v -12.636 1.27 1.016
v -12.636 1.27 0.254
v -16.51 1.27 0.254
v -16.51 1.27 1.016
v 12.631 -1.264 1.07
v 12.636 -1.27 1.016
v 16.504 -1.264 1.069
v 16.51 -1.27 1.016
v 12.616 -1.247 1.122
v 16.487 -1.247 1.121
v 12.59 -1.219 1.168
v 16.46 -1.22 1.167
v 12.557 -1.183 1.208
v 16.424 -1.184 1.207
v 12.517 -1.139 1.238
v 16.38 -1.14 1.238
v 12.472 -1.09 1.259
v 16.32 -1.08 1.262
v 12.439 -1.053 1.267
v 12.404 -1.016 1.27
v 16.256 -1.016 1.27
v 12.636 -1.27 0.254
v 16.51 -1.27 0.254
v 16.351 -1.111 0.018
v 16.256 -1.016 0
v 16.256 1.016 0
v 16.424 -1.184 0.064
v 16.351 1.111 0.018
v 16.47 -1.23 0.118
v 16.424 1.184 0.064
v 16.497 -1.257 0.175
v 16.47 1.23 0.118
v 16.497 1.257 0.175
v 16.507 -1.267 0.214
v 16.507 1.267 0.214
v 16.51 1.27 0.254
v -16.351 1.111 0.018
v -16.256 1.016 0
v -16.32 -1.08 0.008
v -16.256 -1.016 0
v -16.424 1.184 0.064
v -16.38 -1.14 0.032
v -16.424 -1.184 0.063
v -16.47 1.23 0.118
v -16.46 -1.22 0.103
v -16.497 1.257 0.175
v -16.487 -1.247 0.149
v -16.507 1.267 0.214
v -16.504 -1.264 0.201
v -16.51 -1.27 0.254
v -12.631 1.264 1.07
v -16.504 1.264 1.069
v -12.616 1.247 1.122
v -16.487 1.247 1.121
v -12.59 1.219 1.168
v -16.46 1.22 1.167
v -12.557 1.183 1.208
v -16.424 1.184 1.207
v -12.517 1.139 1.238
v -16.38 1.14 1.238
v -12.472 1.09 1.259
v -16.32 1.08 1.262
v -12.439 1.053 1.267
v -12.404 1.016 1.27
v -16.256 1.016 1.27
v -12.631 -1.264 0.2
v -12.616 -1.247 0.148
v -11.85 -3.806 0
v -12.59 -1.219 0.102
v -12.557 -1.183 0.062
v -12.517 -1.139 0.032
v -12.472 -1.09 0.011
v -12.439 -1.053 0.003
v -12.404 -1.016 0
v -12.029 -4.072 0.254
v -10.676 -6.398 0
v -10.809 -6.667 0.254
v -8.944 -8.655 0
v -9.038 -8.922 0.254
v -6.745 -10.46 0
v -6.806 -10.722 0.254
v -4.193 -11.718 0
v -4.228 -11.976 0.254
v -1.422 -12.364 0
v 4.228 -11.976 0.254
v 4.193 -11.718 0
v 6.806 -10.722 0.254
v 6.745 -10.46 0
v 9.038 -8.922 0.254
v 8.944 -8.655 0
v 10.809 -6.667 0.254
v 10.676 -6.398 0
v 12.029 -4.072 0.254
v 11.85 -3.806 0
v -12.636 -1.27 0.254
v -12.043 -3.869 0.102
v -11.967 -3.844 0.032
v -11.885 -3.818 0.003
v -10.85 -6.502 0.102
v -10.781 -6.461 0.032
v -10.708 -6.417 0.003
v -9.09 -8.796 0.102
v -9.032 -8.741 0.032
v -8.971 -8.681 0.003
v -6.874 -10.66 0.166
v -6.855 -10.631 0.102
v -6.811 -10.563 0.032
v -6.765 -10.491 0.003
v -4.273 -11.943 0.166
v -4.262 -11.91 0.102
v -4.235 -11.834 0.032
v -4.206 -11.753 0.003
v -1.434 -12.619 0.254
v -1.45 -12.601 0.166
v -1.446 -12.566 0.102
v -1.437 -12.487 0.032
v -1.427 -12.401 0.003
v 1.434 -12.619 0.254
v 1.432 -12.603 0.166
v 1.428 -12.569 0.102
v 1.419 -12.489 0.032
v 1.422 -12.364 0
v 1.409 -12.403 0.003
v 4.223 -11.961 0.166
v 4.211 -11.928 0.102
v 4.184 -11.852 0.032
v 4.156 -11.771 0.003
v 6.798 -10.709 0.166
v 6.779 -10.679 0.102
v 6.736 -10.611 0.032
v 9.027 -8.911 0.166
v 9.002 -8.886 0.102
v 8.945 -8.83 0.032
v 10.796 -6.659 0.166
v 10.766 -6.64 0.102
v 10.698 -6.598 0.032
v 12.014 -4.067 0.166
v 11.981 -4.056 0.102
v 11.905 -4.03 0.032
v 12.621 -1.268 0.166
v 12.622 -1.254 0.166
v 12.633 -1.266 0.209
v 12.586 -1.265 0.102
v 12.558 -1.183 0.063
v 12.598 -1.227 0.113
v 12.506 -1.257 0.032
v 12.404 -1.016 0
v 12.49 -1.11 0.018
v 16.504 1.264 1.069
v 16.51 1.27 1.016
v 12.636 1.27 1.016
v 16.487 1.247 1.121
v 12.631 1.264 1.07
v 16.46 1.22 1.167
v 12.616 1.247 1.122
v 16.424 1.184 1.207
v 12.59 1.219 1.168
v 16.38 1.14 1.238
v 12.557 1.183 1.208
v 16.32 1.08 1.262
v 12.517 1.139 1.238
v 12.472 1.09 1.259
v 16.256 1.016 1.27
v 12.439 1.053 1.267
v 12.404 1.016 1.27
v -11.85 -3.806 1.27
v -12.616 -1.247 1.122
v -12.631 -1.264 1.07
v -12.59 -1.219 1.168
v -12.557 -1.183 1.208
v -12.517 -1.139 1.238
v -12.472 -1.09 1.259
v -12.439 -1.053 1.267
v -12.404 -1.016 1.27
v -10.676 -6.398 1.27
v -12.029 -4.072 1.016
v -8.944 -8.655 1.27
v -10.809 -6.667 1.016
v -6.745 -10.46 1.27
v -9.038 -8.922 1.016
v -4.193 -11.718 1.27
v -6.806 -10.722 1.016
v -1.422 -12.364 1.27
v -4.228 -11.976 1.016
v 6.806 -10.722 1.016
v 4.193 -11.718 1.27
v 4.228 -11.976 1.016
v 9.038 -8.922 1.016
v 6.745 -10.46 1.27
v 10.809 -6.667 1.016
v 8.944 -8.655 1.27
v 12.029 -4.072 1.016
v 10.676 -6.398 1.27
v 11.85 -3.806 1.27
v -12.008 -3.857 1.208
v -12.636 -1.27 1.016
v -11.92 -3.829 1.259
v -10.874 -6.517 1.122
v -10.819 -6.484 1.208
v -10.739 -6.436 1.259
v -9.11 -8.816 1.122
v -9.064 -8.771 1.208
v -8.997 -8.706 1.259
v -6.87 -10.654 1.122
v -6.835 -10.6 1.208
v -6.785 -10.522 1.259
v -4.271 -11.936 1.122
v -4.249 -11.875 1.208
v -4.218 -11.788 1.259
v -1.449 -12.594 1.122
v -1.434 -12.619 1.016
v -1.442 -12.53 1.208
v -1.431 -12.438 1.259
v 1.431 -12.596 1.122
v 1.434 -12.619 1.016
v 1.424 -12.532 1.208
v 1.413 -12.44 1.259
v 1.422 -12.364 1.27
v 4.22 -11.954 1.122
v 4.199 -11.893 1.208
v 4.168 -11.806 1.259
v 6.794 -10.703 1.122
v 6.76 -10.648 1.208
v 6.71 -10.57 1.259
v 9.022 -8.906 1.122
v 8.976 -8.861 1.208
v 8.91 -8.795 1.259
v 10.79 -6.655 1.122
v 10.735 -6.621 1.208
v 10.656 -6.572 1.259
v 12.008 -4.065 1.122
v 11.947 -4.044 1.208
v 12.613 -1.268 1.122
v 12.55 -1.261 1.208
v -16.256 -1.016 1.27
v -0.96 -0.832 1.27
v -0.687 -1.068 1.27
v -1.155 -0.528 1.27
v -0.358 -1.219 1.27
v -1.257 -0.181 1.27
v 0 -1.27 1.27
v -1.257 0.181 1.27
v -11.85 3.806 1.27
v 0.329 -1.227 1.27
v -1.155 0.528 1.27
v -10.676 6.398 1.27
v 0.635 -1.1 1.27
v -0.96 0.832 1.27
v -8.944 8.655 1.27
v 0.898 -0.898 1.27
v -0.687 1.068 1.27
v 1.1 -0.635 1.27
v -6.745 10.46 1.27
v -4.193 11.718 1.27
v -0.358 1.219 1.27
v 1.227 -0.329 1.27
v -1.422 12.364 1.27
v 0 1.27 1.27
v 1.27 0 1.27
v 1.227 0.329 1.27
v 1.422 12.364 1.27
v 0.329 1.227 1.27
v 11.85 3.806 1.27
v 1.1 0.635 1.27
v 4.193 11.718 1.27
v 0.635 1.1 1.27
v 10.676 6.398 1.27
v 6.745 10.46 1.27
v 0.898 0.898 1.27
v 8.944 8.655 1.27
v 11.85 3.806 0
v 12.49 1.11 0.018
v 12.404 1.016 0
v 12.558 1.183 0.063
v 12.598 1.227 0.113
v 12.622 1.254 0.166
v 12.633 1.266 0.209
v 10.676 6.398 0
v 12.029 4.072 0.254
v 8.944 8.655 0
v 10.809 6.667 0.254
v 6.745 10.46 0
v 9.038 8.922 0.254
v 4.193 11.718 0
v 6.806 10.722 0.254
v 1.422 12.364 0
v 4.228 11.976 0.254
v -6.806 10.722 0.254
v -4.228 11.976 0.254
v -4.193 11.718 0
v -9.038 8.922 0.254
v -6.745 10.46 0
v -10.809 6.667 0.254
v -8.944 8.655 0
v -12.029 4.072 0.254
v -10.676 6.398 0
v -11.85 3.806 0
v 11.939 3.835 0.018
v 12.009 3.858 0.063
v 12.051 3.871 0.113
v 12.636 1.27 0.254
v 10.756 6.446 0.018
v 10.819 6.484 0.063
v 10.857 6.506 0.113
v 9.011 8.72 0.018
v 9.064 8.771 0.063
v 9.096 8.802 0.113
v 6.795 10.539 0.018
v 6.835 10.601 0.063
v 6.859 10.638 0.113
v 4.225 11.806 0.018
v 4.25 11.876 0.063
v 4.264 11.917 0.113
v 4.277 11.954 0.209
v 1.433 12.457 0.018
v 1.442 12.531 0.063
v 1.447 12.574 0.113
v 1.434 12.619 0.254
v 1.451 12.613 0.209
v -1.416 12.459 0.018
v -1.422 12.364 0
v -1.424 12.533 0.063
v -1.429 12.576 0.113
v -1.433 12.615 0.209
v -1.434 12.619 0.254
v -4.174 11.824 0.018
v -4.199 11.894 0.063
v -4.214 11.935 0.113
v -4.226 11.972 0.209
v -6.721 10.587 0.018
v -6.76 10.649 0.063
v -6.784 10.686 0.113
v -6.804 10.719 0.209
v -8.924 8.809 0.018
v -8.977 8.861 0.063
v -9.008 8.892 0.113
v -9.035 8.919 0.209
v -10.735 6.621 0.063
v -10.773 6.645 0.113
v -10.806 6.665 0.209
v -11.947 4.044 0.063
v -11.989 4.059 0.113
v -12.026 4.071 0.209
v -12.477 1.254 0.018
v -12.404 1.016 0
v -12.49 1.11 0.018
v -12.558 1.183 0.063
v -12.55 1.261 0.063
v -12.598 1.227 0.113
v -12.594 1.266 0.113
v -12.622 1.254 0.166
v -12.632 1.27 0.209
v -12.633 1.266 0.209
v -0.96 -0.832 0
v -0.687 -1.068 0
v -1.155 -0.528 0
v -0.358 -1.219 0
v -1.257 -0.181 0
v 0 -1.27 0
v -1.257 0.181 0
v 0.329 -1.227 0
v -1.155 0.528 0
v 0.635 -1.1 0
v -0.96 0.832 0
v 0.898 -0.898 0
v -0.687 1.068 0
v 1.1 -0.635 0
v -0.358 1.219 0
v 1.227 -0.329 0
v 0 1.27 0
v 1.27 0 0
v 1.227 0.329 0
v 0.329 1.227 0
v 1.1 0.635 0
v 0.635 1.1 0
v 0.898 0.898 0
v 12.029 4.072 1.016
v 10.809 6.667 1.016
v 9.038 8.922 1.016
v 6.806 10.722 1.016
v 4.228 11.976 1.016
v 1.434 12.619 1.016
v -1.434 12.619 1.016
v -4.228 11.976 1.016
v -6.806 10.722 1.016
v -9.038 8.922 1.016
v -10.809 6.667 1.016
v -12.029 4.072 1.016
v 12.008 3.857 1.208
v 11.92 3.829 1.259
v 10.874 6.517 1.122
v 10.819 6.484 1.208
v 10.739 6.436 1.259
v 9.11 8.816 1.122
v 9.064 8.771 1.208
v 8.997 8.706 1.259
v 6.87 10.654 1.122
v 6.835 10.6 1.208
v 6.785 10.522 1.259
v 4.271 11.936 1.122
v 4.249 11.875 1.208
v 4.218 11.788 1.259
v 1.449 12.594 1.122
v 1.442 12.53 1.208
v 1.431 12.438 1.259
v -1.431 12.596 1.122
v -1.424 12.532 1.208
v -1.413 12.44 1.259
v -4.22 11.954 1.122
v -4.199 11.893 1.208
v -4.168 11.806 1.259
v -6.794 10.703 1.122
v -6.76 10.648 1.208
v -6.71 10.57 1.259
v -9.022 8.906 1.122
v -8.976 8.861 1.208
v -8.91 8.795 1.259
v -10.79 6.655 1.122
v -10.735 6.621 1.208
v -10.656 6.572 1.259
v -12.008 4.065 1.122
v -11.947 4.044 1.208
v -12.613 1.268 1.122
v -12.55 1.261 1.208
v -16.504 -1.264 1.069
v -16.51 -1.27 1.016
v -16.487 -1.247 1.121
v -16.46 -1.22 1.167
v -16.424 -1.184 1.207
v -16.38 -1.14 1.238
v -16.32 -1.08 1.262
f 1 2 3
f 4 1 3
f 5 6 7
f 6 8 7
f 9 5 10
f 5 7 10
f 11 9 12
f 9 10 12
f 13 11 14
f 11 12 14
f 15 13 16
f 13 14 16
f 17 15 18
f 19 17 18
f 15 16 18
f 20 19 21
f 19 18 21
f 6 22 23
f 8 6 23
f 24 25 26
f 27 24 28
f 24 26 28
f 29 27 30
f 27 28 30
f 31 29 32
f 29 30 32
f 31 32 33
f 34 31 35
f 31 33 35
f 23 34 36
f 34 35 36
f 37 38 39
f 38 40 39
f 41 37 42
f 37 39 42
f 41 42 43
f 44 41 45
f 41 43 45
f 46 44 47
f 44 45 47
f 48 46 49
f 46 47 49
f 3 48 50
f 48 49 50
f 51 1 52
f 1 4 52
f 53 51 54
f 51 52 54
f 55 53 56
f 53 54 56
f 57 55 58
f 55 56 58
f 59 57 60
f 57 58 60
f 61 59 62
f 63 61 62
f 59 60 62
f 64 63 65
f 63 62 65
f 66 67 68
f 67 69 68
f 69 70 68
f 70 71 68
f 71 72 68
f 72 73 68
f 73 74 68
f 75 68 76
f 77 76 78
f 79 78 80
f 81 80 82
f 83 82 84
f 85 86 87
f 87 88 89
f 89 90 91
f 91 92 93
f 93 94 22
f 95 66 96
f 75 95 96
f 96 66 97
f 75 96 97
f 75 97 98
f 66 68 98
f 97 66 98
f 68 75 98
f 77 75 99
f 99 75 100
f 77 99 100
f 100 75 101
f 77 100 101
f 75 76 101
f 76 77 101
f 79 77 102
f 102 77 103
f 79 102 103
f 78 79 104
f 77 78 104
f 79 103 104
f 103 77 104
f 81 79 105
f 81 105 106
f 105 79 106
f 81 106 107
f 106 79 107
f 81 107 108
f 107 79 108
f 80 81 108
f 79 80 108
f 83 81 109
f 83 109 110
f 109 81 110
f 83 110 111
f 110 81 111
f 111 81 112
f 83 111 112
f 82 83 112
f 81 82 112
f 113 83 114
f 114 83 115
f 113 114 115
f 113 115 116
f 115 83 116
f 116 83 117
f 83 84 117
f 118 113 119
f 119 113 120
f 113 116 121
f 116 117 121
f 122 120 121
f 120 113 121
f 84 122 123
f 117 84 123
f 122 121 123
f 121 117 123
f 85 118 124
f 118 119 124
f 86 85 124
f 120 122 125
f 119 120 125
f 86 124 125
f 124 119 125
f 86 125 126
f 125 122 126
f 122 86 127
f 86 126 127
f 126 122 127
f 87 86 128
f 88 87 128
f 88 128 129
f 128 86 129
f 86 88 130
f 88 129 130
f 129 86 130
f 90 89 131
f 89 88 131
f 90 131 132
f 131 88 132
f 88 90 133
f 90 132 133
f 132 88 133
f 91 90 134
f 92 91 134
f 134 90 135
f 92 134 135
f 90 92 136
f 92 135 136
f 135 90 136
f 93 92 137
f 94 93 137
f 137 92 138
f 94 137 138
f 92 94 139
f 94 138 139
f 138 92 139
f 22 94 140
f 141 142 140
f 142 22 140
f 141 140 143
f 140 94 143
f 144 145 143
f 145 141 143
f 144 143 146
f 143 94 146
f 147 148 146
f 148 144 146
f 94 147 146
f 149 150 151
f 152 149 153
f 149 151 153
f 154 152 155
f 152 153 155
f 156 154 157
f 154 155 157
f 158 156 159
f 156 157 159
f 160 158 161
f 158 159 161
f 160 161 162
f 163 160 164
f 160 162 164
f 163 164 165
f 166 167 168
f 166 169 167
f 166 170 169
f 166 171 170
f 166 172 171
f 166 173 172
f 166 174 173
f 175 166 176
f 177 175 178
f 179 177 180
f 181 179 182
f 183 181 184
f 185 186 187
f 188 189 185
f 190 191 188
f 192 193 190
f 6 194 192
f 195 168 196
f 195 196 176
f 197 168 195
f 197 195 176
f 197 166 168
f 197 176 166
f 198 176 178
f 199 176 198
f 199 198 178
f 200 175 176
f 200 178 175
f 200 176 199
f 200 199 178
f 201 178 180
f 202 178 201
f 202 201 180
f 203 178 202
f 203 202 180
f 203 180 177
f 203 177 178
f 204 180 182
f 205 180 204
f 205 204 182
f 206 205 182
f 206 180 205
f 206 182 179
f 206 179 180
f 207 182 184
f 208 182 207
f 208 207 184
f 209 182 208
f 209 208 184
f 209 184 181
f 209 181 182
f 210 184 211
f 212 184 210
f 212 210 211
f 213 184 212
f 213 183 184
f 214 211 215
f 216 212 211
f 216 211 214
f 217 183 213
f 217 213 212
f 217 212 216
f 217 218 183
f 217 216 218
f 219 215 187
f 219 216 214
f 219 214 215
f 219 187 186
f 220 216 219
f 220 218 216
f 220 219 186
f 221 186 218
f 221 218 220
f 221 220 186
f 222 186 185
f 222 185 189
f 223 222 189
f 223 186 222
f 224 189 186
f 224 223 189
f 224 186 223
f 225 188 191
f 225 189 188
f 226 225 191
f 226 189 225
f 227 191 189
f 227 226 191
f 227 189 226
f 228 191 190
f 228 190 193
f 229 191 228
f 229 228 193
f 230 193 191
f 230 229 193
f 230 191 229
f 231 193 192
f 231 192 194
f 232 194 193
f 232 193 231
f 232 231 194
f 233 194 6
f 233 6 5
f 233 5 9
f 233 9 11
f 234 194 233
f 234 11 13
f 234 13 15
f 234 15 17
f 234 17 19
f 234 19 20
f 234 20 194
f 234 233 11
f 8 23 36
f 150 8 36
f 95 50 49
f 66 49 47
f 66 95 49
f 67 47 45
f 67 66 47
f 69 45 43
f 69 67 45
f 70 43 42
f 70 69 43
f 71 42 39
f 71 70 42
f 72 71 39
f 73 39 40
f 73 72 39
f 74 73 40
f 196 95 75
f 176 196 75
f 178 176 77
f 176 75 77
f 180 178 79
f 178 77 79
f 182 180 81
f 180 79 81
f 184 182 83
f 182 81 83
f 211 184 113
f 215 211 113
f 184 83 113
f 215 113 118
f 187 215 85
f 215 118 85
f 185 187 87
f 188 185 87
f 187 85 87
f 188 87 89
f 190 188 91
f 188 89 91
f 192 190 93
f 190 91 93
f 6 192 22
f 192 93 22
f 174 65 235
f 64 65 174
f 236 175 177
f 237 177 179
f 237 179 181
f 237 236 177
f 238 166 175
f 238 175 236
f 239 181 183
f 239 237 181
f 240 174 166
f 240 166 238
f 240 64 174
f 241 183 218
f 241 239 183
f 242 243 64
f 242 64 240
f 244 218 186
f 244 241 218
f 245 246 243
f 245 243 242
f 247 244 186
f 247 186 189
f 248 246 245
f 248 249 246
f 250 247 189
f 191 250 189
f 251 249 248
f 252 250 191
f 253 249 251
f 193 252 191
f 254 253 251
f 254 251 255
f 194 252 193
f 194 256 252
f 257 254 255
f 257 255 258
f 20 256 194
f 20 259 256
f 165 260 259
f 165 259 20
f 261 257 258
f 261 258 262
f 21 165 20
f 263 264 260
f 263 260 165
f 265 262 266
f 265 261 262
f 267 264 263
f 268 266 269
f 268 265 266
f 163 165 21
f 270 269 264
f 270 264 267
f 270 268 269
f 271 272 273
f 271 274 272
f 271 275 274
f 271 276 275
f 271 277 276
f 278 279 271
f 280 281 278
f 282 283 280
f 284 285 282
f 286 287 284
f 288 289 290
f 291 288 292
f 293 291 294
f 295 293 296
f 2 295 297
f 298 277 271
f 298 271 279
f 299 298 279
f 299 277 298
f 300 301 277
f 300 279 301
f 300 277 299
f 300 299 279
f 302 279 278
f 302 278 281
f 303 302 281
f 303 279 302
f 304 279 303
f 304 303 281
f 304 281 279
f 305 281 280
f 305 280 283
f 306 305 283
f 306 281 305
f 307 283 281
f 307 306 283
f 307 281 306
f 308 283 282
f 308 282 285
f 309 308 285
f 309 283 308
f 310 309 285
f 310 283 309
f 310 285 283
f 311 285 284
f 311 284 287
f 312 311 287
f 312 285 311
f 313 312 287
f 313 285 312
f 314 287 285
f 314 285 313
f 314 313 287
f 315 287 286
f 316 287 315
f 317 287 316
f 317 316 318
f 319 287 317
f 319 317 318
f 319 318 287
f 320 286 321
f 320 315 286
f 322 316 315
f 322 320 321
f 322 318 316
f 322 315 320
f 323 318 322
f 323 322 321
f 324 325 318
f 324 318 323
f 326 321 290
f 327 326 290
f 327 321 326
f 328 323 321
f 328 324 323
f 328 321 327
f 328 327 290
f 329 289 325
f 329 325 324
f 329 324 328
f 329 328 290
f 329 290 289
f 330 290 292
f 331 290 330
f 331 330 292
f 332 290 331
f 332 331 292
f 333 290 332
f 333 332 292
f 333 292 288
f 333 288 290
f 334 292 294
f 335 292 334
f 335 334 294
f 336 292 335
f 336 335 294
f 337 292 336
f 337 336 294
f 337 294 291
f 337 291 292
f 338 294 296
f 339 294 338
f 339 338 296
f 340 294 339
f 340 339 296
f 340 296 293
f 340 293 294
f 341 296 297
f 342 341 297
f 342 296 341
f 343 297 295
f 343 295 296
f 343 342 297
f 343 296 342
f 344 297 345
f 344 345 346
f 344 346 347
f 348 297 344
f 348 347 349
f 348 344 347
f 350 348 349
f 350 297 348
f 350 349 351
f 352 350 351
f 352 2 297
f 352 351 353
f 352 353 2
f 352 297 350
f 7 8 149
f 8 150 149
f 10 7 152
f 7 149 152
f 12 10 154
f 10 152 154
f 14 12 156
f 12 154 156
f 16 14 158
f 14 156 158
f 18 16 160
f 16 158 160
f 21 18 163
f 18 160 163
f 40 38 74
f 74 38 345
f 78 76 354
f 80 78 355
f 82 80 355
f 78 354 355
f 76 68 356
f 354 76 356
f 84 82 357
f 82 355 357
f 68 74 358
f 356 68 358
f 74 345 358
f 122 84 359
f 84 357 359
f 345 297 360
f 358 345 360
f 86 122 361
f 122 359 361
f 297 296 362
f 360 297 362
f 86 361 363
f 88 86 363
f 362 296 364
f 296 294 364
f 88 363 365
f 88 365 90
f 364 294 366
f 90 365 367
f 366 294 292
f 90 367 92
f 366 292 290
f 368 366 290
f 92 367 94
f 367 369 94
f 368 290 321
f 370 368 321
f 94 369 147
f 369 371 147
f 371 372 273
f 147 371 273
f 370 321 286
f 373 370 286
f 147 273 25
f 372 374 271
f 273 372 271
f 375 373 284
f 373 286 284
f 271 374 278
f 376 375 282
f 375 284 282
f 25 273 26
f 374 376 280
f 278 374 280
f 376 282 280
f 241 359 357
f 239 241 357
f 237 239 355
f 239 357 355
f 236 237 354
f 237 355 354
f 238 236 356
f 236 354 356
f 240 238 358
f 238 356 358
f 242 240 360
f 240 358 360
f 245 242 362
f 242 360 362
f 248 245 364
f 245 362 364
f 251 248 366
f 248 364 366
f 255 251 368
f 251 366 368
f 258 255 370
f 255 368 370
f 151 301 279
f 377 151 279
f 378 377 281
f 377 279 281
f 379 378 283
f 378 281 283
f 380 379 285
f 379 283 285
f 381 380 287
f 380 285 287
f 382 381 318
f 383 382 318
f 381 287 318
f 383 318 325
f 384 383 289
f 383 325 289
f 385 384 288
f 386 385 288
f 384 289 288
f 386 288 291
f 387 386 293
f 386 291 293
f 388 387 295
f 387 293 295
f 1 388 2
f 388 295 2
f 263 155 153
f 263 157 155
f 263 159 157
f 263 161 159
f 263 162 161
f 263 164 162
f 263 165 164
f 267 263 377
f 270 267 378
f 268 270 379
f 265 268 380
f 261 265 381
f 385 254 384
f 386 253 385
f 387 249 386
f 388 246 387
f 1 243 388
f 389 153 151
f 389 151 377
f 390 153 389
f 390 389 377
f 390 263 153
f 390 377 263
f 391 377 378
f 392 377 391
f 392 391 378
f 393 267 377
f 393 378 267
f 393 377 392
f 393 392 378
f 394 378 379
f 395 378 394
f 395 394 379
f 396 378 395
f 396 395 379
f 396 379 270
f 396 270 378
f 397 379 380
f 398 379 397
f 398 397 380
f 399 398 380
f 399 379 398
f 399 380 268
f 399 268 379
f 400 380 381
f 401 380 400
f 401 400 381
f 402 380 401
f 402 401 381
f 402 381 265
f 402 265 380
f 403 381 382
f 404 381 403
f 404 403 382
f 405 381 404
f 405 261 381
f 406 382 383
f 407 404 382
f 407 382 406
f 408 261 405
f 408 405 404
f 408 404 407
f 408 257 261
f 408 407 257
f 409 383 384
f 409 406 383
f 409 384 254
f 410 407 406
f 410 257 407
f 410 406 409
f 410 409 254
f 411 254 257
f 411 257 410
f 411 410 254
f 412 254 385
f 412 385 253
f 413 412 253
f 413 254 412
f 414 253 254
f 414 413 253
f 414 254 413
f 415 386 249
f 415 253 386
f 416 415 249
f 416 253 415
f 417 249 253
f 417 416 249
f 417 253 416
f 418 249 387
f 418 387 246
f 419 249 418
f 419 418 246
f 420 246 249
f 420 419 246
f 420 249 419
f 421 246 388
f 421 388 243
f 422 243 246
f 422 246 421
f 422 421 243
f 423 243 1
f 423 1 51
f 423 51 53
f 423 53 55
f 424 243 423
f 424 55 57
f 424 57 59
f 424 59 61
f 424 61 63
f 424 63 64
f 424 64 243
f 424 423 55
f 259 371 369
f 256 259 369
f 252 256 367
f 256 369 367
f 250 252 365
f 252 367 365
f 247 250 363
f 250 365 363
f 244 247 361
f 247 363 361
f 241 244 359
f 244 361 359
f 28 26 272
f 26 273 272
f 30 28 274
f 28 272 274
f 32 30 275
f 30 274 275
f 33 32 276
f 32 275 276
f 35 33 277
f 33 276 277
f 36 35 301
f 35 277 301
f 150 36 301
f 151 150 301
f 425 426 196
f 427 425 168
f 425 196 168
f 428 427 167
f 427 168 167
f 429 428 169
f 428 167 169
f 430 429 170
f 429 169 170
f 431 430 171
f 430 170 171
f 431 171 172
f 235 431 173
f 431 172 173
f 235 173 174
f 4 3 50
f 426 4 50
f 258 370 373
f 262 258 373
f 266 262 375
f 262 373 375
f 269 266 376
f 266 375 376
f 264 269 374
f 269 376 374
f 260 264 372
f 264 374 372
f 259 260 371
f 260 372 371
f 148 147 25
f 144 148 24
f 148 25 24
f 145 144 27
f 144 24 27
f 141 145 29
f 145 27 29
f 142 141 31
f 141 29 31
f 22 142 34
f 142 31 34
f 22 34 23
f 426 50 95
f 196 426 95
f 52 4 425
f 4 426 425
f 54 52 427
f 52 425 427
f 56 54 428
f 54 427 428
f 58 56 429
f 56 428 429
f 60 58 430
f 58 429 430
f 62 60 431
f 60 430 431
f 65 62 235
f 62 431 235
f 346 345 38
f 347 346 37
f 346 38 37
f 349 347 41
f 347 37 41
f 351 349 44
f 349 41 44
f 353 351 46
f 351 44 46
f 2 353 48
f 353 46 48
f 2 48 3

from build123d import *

# Parameters (mm, degrees)
F3_DEPTH = 1.27
F1_R     = 0.254
F2_R     = 0.254


with BuildPart() as f3:
    # F0 (on Top) → F3 (new body)
    with BuildSketch(Plane.XY):
        with BuildLine():
            ThreePointArc((-12.6363404513, -1.27), (0, -12.7), (12.6363404513, -1.27))
            Line((12.6363404513, -1.27), (0, -1.27))
            Line((0, -1.27), (-12.6363404513, -1.27))
        make_face()
        with BuildLine():
            Line((6.5e-09, 1.27), (12.6363404513, 1.27))
            ThreePointArc((12.6363404513, 1.27), (0, 12.7), (-12.6363404513, 1.27))
            Line((-12.6363404513, 1.27), (6.5e-09, 1.27))
        make_face()
        with BuildLine():
            ThreePointArc((12.6363404513, 1.27), (12.6840751285, 0.6357972433), (12.7, 0))
            ThreePointArc((12.7, 0), (12.6840751285, -0.6357972433), (12.6363404513, -1.27))
            Line((12.6363404513, -1.27), (16.51, -1.27))
            Line((16.51, -1.27), (16.51, 1.27))
            Line((16.51, 1.27), (12.6363404513, 1.27))
        make_face()
        with BuildLine():
            Line((6.5e-09, 1.27), (-12.6363404513, 1.27))
            ThreePointArc((-12.6363404513, 1.27), (-12.7, 0), (-12.6363404513, -1.27))
            Line((-12.6363404513, -1.27), (0, -1.27))
            ThreePointArc((0, -1.27), (-1.27, 3.2e-09), (6.5e-09, 1.27))
        make_face()
        with BuildLine():
            ThreePointArc((-12.6363404513, -1.27), (-12.7, 0), (-12.6363404513, 1.27))
            Line((-12.6363404513, 1.27), (-16.51, 1.27))
            Line((-16.51, 1.27), (-16.51, -1.27))
            Line((-16.51, -1.27), (-12.6363404513, -1.27))
        make_face()
        with BuildLine():
            ThreePointArc((12.6363404513, -1.27), (12.6840751285, -0.6357972433), (12.7, 0))
            ThreePointArc((12.7, 0), (12.6840751285, 0.6357972433), (12.6363404513, 1.27))
            Line((12.6363404513, 1.27), (6.5e-09, 1.27))
            ThreePointArc((6.5e-09, 1.27), (0.8980256144, 0.8980256098), (1.27, 0))
            ThreePointArc((1.27, 0), (0.8980256121, -0.8980256121), (0, -1.27))
            Line((0, -1.27), (12.6363404513, -1.27))
        make_face()
    extrude(amount=F3_DEPTH)

    # F1
    f1_edges = [f3.edges().sort_by_distance(p)[0] for p in [
        (0, 12.7, 1.27),
        (-14.57317, 1.27, 1.27),
        (-14.57317, -1.27, 1.27),
        (0, -12.7, 1.27),
        (-16.51, 0, 1.27),
        (14.57317, 1.27, 1.27),
        (14.57317, -1.27, 1.27),
        (16.51, 0, 1.27),
    ]]
    fillet(f1_edges, radius=F1_R)

    # F2
    f2_edges = [f3.edges().sort_by_distance(p)[0] for p in [
        (14.57317, -1.27, 0),
        (16.51, 0, 0),
        (14.57317, 1.27, 0),
        (0, 12.7, 0),
        (-14.57317, 1.27, 0),
        (-14.57317, -1.27, 0),
        (0, -12.7, 0),
        (-16.51, 0, 0),
    ]]
    fillet(f2_edges, radius=F2_R)


solid = f3.part
